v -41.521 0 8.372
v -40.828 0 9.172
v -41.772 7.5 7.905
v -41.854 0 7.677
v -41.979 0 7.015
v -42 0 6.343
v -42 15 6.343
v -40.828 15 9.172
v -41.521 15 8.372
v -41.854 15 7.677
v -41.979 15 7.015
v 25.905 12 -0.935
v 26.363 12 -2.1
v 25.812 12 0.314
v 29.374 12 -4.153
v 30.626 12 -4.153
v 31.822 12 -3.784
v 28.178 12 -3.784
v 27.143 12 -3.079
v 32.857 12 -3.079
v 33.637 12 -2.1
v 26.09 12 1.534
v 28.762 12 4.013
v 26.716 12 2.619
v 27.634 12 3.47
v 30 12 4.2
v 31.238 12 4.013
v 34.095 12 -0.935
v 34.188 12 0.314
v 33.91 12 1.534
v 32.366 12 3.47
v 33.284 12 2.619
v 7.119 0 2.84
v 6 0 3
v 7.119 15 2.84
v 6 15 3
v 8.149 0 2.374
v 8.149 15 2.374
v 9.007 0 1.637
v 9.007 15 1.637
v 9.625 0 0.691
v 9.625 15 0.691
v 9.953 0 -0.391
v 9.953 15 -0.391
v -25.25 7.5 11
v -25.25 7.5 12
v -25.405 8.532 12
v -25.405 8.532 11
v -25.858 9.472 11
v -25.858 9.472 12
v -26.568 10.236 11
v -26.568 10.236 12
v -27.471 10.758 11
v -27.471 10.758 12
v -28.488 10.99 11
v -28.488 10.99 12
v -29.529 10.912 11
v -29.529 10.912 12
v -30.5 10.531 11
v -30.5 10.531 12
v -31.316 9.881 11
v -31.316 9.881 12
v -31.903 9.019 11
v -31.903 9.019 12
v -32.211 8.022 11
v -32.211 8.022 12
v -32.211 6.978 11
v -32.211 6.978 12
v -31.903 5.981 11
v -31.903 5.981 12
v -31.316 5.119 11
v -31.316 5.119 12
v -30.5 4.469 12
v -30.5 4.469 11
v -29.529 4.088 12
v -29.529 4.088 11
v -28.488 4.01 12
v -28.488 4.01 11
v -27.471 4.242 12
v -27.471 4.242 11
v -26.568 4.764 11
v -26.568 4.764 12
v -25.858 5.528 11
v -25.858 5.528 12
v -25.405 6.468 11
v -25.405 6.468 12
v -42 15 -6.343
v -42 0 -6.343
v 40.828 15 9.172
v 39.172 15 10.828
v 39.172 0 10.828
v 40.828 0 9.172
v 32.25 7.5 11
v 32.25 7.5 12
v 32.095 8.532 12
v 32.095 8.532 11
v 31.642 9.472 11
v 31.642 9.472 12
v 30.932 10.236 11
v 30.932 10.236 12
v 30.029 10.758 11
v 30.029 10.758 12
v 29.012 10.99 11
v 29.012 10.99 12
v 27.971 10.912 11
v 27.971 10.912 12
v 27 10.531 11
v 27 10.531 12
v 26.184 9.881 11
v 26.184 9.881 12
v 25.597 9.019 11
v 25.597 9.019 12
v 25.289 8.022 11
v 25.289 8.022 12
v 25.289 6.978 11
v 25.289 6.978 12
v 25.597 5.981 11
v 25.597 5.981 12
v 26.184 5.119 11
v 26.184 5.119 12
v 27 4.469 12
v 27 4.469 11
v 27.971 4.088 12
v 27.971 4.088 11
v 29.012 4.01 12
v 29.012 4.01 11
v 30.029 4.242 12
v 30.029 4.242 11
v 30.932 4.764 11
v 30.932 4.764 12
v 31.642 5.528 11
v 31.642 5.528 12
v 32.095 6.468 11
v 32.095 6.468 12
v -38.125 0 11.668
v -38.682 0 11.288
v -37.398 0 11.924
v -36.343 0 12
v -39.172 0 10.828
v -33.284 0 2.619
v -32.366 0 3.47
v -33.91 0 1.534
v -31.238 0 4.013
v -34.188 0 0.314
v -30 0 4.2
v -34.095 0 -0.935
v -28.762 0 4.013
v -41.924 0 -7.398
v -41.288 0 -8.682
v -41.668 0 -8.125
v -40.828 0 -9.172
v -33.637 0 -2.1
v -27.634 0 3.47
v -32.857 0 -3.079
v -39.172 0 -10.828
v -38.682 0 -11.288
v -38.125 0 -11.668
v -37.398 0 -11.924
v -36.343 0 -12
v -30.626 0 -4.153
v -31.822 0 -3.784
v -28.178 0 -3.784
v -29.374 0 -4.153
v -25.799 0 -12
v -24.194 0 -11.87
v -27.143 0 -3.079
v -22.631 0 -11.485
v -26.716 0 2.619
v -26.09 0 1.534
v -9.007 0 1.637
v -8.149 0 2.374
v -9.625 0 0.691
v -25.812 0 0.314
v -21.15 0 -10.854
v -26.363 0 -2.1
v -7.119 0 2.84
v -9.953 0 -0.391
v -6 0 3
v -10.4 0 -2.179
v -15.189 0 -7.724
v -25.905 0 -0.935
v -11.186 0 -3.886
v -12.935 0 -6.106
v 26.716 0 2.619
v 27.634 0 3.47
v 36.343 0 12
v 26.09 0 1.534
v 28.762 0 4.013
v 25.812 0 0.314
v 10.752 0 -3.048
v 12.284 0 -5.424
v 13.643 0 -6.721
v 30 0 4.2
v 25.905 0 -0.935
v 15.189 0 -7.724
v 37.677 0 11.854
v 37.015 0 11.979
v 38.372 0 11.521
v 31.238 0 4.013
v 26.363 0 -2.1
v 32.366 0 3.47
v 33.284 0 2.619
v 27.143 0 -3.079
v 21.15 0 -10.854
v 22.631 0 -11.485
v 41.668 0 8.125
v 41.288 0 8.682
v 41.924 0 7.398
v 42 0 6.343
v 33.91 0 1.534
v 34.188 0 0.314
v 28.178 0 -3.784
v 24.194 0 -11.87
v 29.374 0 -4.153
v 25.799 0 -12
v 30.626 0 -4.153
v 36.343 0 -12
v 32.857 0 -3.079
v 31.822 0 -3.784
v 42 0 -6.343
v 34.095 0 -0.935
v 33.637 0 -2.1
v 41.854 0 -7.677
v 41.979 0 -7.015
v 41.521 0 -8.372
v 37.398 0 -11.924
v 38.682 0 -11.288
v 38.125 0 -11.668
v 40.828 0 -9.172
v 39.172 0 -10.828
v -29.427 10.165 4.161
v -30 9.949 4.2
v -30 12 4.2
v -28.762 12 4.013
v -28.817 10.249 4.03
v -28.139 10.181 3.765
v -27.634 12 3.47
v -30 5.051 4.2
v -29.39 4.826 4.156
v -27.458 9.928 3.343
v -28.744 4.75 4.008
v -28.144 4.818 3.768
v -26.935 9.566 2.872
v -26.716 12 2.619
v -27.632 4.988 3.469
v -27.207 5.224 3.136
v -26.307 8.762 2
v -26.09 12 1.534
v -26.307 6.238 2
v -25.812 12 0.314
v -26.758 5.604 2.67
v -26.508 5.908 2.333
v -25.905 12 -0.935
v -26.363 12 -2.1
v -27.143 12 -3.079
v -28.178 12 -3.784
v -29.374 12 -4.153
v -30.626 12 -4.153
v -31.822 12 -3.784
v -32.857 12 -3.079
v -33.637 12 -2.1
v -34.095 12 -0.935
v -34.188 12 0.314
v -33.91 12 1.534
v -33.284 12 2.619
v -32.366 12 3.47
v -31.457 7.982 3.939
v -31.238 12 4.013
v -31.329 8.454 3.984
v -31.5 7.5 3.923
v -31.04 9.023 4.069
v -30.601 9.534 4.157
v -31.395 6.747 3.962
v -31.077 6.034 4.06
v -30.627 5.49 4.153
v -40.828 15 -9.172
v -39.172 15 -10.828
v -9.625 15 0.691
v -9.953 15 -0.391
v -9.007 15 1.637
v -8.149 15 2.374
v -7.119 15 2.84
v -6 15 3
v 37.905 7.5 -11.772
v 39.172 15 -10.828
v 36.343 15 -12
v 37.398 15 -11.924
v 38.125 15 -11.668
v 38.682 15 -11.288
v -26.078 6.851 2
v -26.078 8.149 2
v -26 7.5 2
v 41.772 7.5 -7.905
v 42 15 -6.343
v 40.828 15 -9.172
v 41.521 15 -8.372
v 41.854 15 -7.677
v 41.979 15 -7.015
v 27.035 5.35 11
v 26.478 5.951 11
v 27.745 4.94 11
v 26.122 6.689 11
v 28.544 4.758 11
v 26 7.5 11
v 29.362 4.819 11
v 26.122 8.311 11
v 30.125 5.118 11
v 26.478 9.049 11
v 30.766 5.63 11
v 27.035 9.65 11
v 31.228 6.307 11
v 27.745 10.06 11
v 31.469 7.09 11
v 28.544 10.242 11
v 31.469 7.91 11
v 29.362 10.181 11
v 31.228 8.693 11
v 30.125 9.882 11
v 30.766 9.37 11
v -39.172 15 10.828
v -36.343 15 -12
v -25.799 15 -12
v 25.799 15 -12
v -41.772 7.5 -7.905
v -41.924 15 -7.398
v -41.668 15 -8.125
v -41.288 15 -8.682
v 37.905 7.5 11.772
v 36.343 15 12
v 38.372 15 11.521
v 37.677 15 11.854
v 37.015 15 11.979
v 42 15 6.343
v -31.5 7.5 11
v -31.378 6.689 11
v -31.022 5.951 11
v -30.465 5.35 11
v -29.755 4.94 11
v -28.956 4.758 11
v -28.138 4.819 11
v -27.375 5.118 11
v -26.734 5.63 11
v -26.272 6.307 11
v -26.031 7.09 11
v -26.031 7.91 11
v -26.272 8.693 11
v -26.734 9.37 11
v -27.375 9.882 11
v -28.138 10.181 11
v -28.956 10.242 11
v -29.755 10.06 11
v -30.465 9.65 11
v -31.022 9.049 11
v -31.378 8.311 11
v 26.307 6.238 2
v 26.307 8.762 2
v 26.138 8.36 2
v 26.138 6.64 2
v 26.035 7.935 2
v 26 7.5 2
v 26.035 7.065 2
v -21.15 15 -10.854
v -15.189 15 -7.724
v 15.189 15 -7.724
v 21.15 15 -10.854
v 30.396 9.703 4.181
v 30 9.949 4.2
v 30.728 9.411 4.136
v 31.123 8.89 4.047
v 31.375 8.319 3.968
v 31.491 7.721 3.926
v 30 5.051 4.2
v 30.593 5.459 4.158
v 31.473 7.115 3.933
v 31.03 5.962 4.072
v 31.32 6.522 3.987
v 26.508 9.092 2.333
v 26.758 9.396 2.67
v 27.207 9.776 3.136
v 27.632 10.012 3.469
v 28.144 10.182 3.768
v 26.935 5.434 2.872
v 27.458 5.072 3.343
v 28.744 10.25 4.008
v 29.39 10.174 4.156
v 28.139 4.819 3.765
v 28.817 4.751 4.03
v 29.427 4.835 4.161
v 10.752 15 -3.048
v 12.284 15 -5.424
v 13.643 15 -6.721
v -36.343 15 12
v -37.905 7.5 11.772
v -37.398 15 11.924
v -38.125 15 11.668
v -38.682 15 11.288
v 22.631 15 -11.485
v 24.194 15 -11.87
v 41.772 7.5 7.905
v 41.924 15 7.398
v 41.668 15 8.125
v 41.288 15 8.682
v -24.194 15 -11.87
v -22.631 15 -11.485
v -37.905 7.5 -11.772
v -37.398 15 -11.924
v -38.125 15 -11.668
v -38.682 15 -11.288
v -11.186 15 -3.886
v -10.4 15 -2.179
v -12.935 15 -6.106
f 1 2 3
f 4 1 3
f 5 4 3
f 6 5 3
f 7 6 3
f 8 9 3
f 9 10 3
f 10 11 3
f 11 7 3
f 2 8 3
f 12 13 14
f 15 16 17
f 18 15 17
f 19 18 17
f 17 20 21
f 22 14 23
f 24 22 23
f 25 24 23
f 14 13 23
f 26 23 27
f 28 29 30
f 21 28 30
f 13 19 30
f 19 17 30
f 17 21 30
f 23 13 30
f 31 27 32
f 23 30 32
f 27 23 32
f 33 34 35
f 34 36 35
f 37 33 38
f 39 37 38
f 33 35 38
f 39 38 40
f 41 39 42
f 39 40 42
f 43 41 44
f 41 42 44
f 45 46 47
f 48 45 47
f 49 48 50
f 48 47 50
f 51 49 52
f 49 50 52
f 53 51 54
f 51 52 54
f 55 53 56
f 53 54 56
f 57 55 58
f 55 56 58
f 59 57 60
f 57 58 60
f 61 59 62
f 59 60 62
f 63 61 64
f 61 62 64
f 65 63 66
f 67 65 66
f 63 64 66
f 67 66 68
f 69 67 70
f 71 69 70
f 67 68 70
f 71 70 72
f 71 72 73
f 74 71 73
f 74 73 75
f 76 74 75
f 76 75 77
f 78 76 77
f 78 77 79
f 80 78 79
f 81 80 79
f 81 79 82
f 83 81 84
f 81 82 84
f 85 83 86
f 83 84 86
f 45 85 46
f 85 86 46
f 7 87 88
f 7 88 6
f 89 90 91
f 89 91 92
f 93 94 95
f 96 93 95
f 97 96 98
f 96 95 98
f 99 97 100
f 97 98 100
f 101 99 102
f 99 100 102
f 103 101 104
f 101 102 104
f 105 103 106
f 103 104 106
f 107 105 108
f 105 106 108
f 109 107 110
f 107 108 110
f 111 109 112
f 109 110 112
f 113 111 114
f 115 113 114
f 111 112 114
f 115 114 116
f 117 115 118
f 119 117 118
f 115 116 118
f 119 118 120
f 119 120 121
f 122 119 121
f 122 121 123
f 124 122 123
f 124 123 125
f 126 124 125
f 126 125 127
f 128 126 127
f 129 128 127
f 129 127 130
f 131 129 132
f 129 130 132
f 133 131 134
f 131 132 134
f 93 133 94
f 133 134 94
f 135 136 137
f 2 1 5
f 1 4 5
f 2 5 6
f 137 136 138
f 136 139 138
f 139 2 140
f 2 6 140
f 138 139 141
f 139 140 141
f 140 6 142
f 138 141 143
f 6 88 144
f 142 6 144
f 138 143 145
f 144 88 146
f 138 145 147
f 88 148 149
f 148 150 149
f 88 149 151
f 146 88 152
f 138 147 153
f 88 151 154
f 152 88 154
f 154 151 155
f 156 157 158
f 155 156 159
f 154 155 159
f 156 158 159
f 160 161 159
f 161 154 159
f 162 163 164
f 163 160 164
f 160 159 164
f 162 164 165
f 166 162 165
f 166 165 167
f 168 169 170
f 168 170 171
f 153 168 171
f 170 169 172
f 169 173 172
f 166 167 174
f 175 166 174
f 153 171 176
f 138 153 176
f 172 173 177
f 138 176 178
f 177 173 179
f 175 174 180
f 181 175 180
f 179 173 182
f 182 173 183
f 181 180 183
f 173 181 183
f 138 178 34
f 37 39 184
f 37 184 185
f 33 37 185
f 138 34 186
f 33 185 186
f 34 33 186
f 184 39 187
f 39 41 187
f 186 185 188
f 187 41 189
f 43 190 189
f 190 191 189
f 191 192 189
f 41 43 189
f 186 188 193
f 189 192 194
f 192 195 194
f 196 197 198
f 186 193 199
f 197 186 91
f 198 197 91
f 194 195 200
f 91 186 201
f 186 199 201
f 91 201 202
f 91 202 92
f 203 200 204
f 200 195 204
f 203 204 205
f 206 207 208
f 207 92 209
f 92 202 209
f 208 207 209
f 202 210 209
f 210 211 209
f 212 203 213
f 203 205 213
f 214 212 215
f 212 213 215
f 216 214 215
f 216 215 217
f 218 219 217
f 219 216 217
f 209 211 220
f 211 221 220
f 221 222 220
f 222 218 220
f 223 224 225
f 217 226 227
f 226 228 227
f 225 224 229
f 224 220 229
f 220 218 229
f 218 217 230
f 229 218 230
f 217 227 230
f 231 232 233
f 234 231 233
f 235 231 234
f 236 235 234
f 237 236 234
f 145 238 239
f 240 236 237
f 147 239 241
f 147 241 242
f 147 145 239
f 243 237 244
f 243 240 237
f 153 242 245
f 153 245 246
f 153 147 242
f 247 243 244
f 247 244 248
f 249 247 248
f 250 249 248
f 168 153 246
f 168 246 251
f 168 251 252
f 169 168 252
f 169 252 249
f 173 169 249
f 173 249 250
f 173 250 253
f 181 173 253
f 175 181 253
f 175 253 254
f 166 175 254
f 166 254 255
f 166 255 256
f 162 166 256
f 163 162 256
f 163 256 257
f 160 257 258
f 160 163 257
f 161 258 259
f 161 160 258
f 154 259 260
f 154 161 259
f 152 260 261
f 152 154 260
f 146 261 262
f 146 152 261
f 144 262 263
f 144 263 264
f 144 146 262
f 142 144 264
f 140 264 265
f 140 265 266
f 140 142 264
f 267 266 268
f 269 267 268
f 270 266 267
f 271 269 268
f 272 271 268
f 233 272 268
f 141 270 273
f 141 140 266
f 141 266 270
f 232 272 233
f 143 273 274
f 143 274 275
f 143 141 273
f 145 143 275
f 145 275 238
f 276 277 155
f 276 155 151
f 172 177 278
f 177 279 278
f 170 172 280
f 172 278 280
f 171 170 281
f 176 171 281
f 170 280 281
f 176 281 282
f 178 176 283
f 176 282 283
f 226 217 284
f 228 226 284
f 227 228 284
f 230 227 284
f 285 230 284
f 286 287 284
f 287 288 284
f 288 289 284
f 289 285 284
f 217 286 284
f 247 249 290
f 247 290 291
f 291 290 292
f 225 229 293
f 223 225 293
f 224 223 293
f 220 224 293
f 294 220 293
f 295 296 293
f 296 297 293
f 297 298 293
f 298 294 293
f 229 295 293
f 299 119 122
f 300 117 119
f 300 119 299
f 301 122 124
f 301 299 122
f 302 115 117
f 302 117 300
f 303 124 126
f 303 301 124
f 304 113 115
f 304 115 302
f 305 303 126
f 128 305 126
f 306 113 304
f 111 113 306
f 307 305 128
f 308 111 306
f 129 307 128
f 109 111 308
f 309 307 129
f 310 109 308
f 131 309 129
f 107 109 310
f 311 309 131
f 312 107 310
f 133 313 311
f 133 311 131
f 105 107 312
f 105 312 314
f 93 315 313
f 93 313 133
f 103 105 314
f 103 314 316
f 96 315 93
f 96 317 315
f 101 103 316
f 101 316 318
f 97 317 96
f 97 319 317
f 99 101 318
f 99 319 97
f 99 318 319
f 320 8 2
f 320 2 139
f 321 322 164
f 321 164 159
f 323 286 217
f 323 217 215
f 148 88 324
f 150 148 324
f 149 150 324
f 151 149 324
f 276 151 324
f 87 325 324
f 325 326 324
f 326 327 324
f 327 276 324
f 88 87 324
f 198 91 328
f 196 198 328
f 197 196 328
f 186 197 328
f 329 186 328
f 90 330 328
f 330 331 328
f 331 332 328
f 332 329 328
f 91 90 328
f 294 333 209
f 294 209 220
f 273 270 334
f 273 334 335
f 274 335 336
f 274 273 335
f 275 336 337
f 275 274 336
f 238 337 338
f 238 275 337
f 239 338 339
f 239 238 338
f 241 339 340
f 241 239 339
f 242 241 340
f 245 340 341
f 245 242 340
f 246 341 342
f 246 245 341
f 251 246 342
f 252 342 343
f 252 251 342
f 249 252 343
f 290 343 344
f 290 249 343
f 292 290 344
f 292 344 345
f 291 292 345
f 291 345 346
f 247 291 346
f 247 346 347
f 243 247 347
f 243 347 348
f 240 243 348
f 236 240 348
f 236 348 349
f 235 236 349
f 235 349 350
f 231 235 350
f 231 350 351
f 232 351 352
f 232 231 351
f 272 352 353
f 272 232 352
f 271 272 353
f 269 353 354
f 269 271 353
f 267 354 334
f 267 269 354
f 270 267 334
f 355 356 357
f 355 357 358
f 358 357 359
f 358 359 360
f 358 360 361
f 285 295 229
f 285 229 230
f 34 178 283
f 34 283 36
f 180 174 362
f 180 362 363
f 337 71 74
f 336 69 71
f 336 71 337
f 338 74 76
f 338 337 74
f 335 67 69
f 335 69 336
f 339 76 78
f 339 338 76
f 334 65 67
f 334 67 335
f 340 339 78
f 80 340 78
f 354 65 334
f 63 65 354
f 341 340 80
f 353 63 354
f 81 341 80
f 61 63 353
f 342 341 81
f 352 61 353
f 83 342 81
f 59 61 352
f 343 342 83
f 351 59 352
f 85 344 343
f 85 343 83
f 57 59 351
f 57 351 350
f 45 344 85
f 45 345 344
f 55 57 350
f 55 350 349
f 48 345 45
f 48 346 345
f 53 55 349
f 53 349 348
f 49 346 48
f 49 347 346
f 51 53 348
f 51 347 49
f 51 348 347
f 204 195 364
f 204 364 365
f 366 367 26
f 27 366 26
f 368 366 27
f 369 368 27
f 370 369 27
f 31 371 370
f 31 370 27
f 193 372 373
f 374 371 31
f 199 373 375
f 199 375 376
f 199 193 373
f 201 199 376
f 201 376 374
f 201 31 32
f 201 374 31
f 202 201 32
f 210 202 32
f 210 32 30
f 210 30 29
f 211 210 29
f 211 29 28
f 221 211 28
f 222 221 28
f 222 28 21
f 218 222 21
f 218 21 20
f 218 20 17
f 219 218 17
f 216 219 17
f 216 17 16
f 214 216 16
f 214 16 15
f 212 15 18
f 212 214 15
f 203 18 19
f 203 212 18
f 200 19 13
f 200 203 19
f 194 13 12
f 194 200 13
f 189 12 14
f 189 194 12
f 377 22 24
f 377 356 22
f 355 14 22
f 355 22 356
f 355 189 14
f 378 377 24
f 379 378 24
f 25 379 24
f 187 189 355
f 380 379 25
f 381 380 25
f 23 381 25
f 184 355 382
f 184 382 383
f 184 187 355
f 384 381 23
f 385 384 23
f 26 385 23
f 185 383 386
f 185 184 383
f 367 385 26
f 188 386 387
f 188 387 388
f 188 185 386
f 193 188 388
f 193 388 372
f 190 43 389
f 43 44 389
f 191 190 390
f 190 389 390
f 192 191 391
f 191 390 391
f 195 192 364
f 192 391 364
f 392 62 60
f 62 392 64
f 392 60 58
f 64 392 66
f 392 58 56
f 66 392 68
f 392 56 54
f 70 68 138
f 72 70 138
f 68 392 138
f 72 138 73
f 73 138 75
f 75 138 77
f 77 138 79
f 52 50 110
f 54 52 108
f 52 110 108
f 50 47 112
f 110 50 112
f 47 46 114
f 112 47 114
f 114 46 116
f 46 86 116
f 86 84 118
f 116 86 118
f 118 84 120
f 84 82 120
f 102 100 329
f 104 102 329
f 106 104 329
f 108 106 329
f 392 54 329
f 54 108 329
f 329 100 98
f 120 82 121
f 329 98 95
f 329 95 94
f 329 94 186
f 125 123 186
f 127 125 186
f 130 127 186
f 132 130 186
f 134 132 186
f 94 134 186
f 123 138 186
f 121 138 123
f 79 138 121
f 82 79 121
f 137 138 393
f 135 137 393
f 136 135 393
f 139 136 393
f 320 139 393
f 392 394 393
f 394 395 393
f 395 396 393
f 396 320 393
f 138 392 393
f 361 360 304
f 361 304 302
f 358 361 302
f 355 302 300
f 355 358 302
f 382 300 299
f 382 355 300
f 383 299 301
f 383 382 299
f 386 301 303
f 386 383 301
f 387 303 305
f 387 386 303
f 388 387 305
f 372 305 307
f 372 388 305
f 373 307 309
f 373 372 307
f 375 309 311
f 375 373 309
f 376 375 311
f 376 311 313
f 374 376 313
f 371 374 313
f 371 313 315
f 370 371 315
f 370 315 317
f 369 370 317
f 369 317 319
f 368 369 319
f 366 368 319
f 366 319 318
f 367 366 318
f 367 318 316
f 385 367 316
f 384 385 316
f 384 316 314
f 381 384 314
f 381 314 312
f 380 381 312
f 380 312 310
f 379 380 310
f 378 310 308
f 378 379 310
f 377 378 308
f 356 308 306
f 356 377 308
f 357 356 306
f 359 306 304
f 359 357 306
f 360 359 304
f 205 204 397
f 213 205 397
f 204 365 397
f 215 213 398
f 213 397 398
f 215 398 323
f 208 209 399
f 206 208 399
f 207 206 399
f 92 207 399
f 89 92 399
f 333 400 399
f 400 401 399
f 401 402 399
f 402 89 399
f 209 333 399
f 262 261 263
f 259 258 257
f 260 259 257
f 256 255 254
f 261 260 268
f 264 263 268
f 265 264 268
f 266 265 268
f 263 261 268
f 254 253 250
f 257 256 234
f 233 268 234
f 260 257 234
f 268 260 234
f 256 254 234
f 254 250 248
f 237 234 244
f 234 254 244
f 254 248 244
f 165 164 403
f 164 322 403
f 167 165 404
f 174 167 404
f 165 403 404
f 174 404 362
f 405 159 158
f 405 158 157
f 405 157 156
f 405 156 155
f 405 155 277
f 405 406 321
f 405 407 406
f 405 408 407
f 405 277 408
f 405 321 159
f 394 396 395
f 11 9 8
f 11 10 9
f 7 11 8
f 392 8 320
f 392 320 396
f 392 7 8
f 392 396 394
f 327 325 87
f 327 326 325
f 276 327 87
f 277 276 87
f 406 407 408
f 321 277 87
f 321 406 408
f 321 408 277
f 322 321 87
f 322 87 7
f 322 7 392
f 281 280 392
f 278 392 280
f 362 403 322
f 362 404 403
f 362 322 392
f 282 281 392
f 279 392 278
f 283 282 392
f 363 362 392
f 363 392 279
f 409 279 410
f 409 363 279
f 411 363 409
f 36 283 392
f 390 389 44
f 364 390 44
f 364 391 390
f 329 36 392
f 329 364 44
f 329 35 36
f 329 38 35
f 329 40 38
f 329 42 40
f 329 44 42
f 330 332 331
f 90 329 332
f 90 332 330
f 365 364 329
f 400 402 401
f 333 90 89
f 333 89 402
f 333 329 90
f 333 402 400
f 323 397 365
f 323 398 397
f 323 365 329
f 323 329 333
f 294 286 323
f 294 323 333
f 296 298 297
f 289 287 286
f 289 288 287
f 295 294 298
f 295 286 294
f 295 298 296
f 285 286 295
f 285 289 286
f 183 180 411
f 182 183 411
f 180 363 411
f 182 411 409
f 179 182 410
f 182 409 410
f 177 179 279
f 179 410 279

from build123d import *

# Parameters (mm, degrees)
ESQUISSE1_W                  = 20
ESQUISSE1_H                  = 12
BOSS_EXTRU_1_DEPTH           = 15
ESQUISSE1_4_R                = 4.2
ENL_V_MAT_EXTRU_1_DEPTH      = 12
CONG_2_R                     = 4
ENL_V_MAT_EXTRU_2_DEPTH      = 54.749418763
ENL_V_MAT_EXTRU_2_DEPTH_BACK = 10
ESQUISSE2_R                  = 2.75
ESQUISSE4_R                  = 3.5
ENL_V_MAT_EXTRU_3_DEPTH      = 1
ESQUISSE5_R                  = 3.5
ENL_V_MAT_EXTRU_4_DEPTH      = 1
ENL_V_MAT_EXTRU_5_DEPTH      = 49.093658782
CONG_3_R                     = 10


with BuildPart() as part:
    # Esquisse1 → Boss.-Extru.1 (new body)
    with BuildSketch(Plane(origin=(0, 0, 0), x_dir=(1, 0, 0), z_dir=(0, 1, 0))):
        Polygon((-38, 12), (-42, 8), (-42, -8), (-38, -12), (38, -12), (42, -8), (42, 8), (38, 12), (22, 12), (14, 18), (-14, 18), (-22, 12), align=None)
        with Locations((0, 3)):
            Rectangle(ESQUISSE1_W, ESQUISSE1_H, mode=Mode.SUBTRACT)
    extrude(amount=BOSS_EXTRU_1_DEPTH)

    # Congé1
    # a fillet whose section is not a circle: 4 mm, written as the material it adds along each edge
    with BuildSketch(Plane(origin=(22, 0, -12), x_dir=(1, 0, 0), z_dir=(0, 1, 0)), Plane(origin=(-22, 0, -12), x_dir=(0.7999999999999996, 0, -0.6000000000000003), z_dir=(0, 1, 0))) as cong_1_piece_1:
        with BuildLine():
            add(Edge.make_bspline([(1.333333333, 0), (1.087283439, 0), (0.841233545, 0), (0.292751215, 0.037020099), (-0.211988912, 0.205266808), (-0.672986836, 0.504740127), (-0.869826751, 0.652370064), (-1.066666667, 0.8)], knots=[0, 0, 0, 0, 0, 0, 0.5, 0.5, 1, 1, 1, 1, 1, 1], degree=5))
            Line((-1.066666667, 0.8), (0, 0))
            Line((0, 0), (1.333333333, 0))
        make_face()
    extrude(amount=15)
    # a fillet whose section is not a circle: 4 mm, written as the material it takes off along each edge
    with BuildSketch(Plane(origin=(42, -4.142135624, 8), x_dir=(-0.707106781186547, 0, 0.7071067811865481), z_dir=(0, 1, 0)), Plane(origin=(38, -4.142135624, 12), x_dir=(-1, 0, 0), z_dir=(0, 1, 0)), Plane(origin=(42, -4.142135624, -8), x_dir=(0, 0, 1), z_dir=(0, 1, 0)), Plane(origin=(38, -4.142135624, -12), x_dir=(0.7071067811865481, 0, 0.707106781186547), z_dir=(0, 1, 0)), Plane(origin=(-42, -4.142135624, -8), x_dir=(0.7071067811865475, 0, -0.7071067811865475), z_dir=(0, 1, 0)), Plane(origin=(-42, -4.142135624, 8), x_dir=(0, 0, -1), z_dir=(0, 1, 0)), Plane(origin=(-38, -4.142135624, 12), x_dir=(-0.7071067811865465, 0, -0.7071067811865486), z_dir=(0, 1, 0))) as cong_1_2_piece_1:
        with BuildLine():
            add(Edge.make_bspline([(1.656854249, 0), (1.35356905, 0), (1.050283851, 0), (0.373674798, -0.056927592), (-0.223974097, -0.30448187), (-0.742662833, -0.742662833), (-0.957117854, -0.957117854), (-1.171572875, -1.171572875)], knots=[0, 0, 0, 0, 0, 0, 0.5, 0.5, 1, 1, 1, 1, 1, 1], degree=5))
            Line((-1.171572875, -1.171572875), (0, 0))
            Line((0, 0), (1.656854249, 0))
        make_face()
    extrude(amount=23.284271247, mode=Mode.SUBTRACT)
    with BuildSketch(Plane(origin=(14, -3.333333333, -18), x_dir=(0.7999999999999996, 0, 0.6000000000000003), z_dir=(0, 1, 0)), Plane(origin=(-14, -3.333333333, -18), x_dir=(1, 0, 0), z_dir=(0, 1, 0))) as cong_1_2_piece_2:
        with BuildLine():
            add(Edge.make_bspline([(1.333333333, 0), (1.087283439, 0), (0.841233545, 0), (0.292751215, -0.037020099), (-0.211988912, -0.205266808), (-0.672986836, -0.504740127), (-0.869826751, -0.652370064), (-1.066666667, -0.8)], knots=[0, 0, 0, 0, 0, 0, 0.5, 0.5, 1, 1, 1, 1, 1, 1], degree=5))
            Line((-1.066666667, -0.8), (0, 0))
            Line((0, 0), (1.333333333, 0))
        make_face()
    extrude(amount=21.666666667, mode=Mode.SUBTRACT)
    with BuildSketch(Plane(origin=(-38, -4.142135624, -12), x_dir=(-0.7071067811865465, 0, 0.7071067811865486), z_dir=(0, 1, 0))) as cong_1_2_piece_3:
        with BuildLine():
            add(Edge.make_bspline([(1.656854249, 0), (1.35356905, 0), (1.050283851, 0), (0.373674798, 0.056927592), (-0.223974097, 0.30448187), (-0.742662833, 0.742662833), (-0.957117854, 0.957117854), (-1.171572875, 1.171572875)], knots=[0, 0, 0, 0, 0, 0, 0.5, 0.5, 1, 1, 1, 1, 1, 1], degree=5))
            Line((-1.171572875, 1.171572875), (0, 0))
            Line((0, 0), (1.656854249, 0))
        make_face()
    extrude(amount=23.284271247, mode=Mode.SUBTRACT)

    # Esquisse1<4> → Enlèv. mat.-Extru.1 (cut)
    with BuildSketch(Plane(origin=(0, 0, 0), x_dir=(1, 0, 0), z_dir=(0, 1, 0))):
        with Locations(Location((-30, 0, 0), (0, 0, 270))):
            Circle(ESQUISSE1_4_R)
        with Locations(Location((30, 0, 0), (0, 0, 270))):
            Circle(ESQUISSE1_4_R)
    extrude(amount=ENL_V_MAT_EXTRU_1_DEPTH, mode=Mode.SUBTRACT)

    # Congé2
    cong_2_edges = [part.edges().sort_by_distance(p)[0] for p in [
        (-10, 7.5, -9),
        (-10, 7.5, 3),
        (10, 7.5, 3),
        (10, 7.5, -9),
    ]]
    fillet(cong_2_edges, radius=CONG_2_R)

    # Esquisse2 → Enlèv. mat.-Extru.2 (cut, two sides: drawn at the far end of the back side and taken through both)
    with BuildSketch(Plane.XY.offset(12).offset(-ENL_V_MAT_EXTRU_2_DEPTH_BACK)):
        with Locations(Location((-28.75, 7.5, 0), (0, 0, 180))):
            Circle(ESQUISSE2_R)
        with Locations(Location((28.75, 7.5, 0), (0, 0, 180))):
            Circle(ESQUISSE2_R)
    extrude(amount=ENL_V_MAT_EXTRU_2_DEPTH + ENL_V_MAT_EXTRU_2_DEPTH_BACK, mode=Mode.SUBTRACT)

    # Esquisse4 → Enlèv. mat.-Extru.3 (cut)
    with BuildSketch(Plane.XY.offset(12)):
        with Locations((28.75, 7.5)):
            Circle(ESQUISSE4_R)
    extrude(amount=-ENL_V_MAT_EXTRU_3_DEPTH, mode=Mode.SUBTRACT)

    # Esquisse5 → Enlèv. mat.-Extru.4 (cut)
    with BuildSketch(Plane.XY.offset(12)):
        with Locations((-28.75, 7.5)):
            Circle(ESQUISSE5_R)
    extrude(amount=-ENL_V_MAT_EXTRU_4_DEPTH, mode=Mode.SUBTRACT)

    # Esquisse6 → Enlèv. mat.-Extru.5 (cut, through all)
    with BuildSketch(Plane.XZ):
        Polygon((-23.333333333, -12), (-10, -5), (10, -5), (23.333333333, -12), (23.333333333, -18), (-23.333333333, -18), align=None)
    extrude(amount=-ENL_V_MAT_EXTRU_5_DEPTH, mode=Mode.SUBTRACT)

    # Congé3
    cong_3_edges = [part.edges().sort_by_distance(p)[0] for p in [
        (-23.333333333, 7.5, -12),
        (-10, 7.5, -5),
        (10, 7.5, -5),
        (23.333333333, 7.5, -12),
    ]]
    fillet(cong_3_edges, radius=CONG_3_R)


solid = part.part
